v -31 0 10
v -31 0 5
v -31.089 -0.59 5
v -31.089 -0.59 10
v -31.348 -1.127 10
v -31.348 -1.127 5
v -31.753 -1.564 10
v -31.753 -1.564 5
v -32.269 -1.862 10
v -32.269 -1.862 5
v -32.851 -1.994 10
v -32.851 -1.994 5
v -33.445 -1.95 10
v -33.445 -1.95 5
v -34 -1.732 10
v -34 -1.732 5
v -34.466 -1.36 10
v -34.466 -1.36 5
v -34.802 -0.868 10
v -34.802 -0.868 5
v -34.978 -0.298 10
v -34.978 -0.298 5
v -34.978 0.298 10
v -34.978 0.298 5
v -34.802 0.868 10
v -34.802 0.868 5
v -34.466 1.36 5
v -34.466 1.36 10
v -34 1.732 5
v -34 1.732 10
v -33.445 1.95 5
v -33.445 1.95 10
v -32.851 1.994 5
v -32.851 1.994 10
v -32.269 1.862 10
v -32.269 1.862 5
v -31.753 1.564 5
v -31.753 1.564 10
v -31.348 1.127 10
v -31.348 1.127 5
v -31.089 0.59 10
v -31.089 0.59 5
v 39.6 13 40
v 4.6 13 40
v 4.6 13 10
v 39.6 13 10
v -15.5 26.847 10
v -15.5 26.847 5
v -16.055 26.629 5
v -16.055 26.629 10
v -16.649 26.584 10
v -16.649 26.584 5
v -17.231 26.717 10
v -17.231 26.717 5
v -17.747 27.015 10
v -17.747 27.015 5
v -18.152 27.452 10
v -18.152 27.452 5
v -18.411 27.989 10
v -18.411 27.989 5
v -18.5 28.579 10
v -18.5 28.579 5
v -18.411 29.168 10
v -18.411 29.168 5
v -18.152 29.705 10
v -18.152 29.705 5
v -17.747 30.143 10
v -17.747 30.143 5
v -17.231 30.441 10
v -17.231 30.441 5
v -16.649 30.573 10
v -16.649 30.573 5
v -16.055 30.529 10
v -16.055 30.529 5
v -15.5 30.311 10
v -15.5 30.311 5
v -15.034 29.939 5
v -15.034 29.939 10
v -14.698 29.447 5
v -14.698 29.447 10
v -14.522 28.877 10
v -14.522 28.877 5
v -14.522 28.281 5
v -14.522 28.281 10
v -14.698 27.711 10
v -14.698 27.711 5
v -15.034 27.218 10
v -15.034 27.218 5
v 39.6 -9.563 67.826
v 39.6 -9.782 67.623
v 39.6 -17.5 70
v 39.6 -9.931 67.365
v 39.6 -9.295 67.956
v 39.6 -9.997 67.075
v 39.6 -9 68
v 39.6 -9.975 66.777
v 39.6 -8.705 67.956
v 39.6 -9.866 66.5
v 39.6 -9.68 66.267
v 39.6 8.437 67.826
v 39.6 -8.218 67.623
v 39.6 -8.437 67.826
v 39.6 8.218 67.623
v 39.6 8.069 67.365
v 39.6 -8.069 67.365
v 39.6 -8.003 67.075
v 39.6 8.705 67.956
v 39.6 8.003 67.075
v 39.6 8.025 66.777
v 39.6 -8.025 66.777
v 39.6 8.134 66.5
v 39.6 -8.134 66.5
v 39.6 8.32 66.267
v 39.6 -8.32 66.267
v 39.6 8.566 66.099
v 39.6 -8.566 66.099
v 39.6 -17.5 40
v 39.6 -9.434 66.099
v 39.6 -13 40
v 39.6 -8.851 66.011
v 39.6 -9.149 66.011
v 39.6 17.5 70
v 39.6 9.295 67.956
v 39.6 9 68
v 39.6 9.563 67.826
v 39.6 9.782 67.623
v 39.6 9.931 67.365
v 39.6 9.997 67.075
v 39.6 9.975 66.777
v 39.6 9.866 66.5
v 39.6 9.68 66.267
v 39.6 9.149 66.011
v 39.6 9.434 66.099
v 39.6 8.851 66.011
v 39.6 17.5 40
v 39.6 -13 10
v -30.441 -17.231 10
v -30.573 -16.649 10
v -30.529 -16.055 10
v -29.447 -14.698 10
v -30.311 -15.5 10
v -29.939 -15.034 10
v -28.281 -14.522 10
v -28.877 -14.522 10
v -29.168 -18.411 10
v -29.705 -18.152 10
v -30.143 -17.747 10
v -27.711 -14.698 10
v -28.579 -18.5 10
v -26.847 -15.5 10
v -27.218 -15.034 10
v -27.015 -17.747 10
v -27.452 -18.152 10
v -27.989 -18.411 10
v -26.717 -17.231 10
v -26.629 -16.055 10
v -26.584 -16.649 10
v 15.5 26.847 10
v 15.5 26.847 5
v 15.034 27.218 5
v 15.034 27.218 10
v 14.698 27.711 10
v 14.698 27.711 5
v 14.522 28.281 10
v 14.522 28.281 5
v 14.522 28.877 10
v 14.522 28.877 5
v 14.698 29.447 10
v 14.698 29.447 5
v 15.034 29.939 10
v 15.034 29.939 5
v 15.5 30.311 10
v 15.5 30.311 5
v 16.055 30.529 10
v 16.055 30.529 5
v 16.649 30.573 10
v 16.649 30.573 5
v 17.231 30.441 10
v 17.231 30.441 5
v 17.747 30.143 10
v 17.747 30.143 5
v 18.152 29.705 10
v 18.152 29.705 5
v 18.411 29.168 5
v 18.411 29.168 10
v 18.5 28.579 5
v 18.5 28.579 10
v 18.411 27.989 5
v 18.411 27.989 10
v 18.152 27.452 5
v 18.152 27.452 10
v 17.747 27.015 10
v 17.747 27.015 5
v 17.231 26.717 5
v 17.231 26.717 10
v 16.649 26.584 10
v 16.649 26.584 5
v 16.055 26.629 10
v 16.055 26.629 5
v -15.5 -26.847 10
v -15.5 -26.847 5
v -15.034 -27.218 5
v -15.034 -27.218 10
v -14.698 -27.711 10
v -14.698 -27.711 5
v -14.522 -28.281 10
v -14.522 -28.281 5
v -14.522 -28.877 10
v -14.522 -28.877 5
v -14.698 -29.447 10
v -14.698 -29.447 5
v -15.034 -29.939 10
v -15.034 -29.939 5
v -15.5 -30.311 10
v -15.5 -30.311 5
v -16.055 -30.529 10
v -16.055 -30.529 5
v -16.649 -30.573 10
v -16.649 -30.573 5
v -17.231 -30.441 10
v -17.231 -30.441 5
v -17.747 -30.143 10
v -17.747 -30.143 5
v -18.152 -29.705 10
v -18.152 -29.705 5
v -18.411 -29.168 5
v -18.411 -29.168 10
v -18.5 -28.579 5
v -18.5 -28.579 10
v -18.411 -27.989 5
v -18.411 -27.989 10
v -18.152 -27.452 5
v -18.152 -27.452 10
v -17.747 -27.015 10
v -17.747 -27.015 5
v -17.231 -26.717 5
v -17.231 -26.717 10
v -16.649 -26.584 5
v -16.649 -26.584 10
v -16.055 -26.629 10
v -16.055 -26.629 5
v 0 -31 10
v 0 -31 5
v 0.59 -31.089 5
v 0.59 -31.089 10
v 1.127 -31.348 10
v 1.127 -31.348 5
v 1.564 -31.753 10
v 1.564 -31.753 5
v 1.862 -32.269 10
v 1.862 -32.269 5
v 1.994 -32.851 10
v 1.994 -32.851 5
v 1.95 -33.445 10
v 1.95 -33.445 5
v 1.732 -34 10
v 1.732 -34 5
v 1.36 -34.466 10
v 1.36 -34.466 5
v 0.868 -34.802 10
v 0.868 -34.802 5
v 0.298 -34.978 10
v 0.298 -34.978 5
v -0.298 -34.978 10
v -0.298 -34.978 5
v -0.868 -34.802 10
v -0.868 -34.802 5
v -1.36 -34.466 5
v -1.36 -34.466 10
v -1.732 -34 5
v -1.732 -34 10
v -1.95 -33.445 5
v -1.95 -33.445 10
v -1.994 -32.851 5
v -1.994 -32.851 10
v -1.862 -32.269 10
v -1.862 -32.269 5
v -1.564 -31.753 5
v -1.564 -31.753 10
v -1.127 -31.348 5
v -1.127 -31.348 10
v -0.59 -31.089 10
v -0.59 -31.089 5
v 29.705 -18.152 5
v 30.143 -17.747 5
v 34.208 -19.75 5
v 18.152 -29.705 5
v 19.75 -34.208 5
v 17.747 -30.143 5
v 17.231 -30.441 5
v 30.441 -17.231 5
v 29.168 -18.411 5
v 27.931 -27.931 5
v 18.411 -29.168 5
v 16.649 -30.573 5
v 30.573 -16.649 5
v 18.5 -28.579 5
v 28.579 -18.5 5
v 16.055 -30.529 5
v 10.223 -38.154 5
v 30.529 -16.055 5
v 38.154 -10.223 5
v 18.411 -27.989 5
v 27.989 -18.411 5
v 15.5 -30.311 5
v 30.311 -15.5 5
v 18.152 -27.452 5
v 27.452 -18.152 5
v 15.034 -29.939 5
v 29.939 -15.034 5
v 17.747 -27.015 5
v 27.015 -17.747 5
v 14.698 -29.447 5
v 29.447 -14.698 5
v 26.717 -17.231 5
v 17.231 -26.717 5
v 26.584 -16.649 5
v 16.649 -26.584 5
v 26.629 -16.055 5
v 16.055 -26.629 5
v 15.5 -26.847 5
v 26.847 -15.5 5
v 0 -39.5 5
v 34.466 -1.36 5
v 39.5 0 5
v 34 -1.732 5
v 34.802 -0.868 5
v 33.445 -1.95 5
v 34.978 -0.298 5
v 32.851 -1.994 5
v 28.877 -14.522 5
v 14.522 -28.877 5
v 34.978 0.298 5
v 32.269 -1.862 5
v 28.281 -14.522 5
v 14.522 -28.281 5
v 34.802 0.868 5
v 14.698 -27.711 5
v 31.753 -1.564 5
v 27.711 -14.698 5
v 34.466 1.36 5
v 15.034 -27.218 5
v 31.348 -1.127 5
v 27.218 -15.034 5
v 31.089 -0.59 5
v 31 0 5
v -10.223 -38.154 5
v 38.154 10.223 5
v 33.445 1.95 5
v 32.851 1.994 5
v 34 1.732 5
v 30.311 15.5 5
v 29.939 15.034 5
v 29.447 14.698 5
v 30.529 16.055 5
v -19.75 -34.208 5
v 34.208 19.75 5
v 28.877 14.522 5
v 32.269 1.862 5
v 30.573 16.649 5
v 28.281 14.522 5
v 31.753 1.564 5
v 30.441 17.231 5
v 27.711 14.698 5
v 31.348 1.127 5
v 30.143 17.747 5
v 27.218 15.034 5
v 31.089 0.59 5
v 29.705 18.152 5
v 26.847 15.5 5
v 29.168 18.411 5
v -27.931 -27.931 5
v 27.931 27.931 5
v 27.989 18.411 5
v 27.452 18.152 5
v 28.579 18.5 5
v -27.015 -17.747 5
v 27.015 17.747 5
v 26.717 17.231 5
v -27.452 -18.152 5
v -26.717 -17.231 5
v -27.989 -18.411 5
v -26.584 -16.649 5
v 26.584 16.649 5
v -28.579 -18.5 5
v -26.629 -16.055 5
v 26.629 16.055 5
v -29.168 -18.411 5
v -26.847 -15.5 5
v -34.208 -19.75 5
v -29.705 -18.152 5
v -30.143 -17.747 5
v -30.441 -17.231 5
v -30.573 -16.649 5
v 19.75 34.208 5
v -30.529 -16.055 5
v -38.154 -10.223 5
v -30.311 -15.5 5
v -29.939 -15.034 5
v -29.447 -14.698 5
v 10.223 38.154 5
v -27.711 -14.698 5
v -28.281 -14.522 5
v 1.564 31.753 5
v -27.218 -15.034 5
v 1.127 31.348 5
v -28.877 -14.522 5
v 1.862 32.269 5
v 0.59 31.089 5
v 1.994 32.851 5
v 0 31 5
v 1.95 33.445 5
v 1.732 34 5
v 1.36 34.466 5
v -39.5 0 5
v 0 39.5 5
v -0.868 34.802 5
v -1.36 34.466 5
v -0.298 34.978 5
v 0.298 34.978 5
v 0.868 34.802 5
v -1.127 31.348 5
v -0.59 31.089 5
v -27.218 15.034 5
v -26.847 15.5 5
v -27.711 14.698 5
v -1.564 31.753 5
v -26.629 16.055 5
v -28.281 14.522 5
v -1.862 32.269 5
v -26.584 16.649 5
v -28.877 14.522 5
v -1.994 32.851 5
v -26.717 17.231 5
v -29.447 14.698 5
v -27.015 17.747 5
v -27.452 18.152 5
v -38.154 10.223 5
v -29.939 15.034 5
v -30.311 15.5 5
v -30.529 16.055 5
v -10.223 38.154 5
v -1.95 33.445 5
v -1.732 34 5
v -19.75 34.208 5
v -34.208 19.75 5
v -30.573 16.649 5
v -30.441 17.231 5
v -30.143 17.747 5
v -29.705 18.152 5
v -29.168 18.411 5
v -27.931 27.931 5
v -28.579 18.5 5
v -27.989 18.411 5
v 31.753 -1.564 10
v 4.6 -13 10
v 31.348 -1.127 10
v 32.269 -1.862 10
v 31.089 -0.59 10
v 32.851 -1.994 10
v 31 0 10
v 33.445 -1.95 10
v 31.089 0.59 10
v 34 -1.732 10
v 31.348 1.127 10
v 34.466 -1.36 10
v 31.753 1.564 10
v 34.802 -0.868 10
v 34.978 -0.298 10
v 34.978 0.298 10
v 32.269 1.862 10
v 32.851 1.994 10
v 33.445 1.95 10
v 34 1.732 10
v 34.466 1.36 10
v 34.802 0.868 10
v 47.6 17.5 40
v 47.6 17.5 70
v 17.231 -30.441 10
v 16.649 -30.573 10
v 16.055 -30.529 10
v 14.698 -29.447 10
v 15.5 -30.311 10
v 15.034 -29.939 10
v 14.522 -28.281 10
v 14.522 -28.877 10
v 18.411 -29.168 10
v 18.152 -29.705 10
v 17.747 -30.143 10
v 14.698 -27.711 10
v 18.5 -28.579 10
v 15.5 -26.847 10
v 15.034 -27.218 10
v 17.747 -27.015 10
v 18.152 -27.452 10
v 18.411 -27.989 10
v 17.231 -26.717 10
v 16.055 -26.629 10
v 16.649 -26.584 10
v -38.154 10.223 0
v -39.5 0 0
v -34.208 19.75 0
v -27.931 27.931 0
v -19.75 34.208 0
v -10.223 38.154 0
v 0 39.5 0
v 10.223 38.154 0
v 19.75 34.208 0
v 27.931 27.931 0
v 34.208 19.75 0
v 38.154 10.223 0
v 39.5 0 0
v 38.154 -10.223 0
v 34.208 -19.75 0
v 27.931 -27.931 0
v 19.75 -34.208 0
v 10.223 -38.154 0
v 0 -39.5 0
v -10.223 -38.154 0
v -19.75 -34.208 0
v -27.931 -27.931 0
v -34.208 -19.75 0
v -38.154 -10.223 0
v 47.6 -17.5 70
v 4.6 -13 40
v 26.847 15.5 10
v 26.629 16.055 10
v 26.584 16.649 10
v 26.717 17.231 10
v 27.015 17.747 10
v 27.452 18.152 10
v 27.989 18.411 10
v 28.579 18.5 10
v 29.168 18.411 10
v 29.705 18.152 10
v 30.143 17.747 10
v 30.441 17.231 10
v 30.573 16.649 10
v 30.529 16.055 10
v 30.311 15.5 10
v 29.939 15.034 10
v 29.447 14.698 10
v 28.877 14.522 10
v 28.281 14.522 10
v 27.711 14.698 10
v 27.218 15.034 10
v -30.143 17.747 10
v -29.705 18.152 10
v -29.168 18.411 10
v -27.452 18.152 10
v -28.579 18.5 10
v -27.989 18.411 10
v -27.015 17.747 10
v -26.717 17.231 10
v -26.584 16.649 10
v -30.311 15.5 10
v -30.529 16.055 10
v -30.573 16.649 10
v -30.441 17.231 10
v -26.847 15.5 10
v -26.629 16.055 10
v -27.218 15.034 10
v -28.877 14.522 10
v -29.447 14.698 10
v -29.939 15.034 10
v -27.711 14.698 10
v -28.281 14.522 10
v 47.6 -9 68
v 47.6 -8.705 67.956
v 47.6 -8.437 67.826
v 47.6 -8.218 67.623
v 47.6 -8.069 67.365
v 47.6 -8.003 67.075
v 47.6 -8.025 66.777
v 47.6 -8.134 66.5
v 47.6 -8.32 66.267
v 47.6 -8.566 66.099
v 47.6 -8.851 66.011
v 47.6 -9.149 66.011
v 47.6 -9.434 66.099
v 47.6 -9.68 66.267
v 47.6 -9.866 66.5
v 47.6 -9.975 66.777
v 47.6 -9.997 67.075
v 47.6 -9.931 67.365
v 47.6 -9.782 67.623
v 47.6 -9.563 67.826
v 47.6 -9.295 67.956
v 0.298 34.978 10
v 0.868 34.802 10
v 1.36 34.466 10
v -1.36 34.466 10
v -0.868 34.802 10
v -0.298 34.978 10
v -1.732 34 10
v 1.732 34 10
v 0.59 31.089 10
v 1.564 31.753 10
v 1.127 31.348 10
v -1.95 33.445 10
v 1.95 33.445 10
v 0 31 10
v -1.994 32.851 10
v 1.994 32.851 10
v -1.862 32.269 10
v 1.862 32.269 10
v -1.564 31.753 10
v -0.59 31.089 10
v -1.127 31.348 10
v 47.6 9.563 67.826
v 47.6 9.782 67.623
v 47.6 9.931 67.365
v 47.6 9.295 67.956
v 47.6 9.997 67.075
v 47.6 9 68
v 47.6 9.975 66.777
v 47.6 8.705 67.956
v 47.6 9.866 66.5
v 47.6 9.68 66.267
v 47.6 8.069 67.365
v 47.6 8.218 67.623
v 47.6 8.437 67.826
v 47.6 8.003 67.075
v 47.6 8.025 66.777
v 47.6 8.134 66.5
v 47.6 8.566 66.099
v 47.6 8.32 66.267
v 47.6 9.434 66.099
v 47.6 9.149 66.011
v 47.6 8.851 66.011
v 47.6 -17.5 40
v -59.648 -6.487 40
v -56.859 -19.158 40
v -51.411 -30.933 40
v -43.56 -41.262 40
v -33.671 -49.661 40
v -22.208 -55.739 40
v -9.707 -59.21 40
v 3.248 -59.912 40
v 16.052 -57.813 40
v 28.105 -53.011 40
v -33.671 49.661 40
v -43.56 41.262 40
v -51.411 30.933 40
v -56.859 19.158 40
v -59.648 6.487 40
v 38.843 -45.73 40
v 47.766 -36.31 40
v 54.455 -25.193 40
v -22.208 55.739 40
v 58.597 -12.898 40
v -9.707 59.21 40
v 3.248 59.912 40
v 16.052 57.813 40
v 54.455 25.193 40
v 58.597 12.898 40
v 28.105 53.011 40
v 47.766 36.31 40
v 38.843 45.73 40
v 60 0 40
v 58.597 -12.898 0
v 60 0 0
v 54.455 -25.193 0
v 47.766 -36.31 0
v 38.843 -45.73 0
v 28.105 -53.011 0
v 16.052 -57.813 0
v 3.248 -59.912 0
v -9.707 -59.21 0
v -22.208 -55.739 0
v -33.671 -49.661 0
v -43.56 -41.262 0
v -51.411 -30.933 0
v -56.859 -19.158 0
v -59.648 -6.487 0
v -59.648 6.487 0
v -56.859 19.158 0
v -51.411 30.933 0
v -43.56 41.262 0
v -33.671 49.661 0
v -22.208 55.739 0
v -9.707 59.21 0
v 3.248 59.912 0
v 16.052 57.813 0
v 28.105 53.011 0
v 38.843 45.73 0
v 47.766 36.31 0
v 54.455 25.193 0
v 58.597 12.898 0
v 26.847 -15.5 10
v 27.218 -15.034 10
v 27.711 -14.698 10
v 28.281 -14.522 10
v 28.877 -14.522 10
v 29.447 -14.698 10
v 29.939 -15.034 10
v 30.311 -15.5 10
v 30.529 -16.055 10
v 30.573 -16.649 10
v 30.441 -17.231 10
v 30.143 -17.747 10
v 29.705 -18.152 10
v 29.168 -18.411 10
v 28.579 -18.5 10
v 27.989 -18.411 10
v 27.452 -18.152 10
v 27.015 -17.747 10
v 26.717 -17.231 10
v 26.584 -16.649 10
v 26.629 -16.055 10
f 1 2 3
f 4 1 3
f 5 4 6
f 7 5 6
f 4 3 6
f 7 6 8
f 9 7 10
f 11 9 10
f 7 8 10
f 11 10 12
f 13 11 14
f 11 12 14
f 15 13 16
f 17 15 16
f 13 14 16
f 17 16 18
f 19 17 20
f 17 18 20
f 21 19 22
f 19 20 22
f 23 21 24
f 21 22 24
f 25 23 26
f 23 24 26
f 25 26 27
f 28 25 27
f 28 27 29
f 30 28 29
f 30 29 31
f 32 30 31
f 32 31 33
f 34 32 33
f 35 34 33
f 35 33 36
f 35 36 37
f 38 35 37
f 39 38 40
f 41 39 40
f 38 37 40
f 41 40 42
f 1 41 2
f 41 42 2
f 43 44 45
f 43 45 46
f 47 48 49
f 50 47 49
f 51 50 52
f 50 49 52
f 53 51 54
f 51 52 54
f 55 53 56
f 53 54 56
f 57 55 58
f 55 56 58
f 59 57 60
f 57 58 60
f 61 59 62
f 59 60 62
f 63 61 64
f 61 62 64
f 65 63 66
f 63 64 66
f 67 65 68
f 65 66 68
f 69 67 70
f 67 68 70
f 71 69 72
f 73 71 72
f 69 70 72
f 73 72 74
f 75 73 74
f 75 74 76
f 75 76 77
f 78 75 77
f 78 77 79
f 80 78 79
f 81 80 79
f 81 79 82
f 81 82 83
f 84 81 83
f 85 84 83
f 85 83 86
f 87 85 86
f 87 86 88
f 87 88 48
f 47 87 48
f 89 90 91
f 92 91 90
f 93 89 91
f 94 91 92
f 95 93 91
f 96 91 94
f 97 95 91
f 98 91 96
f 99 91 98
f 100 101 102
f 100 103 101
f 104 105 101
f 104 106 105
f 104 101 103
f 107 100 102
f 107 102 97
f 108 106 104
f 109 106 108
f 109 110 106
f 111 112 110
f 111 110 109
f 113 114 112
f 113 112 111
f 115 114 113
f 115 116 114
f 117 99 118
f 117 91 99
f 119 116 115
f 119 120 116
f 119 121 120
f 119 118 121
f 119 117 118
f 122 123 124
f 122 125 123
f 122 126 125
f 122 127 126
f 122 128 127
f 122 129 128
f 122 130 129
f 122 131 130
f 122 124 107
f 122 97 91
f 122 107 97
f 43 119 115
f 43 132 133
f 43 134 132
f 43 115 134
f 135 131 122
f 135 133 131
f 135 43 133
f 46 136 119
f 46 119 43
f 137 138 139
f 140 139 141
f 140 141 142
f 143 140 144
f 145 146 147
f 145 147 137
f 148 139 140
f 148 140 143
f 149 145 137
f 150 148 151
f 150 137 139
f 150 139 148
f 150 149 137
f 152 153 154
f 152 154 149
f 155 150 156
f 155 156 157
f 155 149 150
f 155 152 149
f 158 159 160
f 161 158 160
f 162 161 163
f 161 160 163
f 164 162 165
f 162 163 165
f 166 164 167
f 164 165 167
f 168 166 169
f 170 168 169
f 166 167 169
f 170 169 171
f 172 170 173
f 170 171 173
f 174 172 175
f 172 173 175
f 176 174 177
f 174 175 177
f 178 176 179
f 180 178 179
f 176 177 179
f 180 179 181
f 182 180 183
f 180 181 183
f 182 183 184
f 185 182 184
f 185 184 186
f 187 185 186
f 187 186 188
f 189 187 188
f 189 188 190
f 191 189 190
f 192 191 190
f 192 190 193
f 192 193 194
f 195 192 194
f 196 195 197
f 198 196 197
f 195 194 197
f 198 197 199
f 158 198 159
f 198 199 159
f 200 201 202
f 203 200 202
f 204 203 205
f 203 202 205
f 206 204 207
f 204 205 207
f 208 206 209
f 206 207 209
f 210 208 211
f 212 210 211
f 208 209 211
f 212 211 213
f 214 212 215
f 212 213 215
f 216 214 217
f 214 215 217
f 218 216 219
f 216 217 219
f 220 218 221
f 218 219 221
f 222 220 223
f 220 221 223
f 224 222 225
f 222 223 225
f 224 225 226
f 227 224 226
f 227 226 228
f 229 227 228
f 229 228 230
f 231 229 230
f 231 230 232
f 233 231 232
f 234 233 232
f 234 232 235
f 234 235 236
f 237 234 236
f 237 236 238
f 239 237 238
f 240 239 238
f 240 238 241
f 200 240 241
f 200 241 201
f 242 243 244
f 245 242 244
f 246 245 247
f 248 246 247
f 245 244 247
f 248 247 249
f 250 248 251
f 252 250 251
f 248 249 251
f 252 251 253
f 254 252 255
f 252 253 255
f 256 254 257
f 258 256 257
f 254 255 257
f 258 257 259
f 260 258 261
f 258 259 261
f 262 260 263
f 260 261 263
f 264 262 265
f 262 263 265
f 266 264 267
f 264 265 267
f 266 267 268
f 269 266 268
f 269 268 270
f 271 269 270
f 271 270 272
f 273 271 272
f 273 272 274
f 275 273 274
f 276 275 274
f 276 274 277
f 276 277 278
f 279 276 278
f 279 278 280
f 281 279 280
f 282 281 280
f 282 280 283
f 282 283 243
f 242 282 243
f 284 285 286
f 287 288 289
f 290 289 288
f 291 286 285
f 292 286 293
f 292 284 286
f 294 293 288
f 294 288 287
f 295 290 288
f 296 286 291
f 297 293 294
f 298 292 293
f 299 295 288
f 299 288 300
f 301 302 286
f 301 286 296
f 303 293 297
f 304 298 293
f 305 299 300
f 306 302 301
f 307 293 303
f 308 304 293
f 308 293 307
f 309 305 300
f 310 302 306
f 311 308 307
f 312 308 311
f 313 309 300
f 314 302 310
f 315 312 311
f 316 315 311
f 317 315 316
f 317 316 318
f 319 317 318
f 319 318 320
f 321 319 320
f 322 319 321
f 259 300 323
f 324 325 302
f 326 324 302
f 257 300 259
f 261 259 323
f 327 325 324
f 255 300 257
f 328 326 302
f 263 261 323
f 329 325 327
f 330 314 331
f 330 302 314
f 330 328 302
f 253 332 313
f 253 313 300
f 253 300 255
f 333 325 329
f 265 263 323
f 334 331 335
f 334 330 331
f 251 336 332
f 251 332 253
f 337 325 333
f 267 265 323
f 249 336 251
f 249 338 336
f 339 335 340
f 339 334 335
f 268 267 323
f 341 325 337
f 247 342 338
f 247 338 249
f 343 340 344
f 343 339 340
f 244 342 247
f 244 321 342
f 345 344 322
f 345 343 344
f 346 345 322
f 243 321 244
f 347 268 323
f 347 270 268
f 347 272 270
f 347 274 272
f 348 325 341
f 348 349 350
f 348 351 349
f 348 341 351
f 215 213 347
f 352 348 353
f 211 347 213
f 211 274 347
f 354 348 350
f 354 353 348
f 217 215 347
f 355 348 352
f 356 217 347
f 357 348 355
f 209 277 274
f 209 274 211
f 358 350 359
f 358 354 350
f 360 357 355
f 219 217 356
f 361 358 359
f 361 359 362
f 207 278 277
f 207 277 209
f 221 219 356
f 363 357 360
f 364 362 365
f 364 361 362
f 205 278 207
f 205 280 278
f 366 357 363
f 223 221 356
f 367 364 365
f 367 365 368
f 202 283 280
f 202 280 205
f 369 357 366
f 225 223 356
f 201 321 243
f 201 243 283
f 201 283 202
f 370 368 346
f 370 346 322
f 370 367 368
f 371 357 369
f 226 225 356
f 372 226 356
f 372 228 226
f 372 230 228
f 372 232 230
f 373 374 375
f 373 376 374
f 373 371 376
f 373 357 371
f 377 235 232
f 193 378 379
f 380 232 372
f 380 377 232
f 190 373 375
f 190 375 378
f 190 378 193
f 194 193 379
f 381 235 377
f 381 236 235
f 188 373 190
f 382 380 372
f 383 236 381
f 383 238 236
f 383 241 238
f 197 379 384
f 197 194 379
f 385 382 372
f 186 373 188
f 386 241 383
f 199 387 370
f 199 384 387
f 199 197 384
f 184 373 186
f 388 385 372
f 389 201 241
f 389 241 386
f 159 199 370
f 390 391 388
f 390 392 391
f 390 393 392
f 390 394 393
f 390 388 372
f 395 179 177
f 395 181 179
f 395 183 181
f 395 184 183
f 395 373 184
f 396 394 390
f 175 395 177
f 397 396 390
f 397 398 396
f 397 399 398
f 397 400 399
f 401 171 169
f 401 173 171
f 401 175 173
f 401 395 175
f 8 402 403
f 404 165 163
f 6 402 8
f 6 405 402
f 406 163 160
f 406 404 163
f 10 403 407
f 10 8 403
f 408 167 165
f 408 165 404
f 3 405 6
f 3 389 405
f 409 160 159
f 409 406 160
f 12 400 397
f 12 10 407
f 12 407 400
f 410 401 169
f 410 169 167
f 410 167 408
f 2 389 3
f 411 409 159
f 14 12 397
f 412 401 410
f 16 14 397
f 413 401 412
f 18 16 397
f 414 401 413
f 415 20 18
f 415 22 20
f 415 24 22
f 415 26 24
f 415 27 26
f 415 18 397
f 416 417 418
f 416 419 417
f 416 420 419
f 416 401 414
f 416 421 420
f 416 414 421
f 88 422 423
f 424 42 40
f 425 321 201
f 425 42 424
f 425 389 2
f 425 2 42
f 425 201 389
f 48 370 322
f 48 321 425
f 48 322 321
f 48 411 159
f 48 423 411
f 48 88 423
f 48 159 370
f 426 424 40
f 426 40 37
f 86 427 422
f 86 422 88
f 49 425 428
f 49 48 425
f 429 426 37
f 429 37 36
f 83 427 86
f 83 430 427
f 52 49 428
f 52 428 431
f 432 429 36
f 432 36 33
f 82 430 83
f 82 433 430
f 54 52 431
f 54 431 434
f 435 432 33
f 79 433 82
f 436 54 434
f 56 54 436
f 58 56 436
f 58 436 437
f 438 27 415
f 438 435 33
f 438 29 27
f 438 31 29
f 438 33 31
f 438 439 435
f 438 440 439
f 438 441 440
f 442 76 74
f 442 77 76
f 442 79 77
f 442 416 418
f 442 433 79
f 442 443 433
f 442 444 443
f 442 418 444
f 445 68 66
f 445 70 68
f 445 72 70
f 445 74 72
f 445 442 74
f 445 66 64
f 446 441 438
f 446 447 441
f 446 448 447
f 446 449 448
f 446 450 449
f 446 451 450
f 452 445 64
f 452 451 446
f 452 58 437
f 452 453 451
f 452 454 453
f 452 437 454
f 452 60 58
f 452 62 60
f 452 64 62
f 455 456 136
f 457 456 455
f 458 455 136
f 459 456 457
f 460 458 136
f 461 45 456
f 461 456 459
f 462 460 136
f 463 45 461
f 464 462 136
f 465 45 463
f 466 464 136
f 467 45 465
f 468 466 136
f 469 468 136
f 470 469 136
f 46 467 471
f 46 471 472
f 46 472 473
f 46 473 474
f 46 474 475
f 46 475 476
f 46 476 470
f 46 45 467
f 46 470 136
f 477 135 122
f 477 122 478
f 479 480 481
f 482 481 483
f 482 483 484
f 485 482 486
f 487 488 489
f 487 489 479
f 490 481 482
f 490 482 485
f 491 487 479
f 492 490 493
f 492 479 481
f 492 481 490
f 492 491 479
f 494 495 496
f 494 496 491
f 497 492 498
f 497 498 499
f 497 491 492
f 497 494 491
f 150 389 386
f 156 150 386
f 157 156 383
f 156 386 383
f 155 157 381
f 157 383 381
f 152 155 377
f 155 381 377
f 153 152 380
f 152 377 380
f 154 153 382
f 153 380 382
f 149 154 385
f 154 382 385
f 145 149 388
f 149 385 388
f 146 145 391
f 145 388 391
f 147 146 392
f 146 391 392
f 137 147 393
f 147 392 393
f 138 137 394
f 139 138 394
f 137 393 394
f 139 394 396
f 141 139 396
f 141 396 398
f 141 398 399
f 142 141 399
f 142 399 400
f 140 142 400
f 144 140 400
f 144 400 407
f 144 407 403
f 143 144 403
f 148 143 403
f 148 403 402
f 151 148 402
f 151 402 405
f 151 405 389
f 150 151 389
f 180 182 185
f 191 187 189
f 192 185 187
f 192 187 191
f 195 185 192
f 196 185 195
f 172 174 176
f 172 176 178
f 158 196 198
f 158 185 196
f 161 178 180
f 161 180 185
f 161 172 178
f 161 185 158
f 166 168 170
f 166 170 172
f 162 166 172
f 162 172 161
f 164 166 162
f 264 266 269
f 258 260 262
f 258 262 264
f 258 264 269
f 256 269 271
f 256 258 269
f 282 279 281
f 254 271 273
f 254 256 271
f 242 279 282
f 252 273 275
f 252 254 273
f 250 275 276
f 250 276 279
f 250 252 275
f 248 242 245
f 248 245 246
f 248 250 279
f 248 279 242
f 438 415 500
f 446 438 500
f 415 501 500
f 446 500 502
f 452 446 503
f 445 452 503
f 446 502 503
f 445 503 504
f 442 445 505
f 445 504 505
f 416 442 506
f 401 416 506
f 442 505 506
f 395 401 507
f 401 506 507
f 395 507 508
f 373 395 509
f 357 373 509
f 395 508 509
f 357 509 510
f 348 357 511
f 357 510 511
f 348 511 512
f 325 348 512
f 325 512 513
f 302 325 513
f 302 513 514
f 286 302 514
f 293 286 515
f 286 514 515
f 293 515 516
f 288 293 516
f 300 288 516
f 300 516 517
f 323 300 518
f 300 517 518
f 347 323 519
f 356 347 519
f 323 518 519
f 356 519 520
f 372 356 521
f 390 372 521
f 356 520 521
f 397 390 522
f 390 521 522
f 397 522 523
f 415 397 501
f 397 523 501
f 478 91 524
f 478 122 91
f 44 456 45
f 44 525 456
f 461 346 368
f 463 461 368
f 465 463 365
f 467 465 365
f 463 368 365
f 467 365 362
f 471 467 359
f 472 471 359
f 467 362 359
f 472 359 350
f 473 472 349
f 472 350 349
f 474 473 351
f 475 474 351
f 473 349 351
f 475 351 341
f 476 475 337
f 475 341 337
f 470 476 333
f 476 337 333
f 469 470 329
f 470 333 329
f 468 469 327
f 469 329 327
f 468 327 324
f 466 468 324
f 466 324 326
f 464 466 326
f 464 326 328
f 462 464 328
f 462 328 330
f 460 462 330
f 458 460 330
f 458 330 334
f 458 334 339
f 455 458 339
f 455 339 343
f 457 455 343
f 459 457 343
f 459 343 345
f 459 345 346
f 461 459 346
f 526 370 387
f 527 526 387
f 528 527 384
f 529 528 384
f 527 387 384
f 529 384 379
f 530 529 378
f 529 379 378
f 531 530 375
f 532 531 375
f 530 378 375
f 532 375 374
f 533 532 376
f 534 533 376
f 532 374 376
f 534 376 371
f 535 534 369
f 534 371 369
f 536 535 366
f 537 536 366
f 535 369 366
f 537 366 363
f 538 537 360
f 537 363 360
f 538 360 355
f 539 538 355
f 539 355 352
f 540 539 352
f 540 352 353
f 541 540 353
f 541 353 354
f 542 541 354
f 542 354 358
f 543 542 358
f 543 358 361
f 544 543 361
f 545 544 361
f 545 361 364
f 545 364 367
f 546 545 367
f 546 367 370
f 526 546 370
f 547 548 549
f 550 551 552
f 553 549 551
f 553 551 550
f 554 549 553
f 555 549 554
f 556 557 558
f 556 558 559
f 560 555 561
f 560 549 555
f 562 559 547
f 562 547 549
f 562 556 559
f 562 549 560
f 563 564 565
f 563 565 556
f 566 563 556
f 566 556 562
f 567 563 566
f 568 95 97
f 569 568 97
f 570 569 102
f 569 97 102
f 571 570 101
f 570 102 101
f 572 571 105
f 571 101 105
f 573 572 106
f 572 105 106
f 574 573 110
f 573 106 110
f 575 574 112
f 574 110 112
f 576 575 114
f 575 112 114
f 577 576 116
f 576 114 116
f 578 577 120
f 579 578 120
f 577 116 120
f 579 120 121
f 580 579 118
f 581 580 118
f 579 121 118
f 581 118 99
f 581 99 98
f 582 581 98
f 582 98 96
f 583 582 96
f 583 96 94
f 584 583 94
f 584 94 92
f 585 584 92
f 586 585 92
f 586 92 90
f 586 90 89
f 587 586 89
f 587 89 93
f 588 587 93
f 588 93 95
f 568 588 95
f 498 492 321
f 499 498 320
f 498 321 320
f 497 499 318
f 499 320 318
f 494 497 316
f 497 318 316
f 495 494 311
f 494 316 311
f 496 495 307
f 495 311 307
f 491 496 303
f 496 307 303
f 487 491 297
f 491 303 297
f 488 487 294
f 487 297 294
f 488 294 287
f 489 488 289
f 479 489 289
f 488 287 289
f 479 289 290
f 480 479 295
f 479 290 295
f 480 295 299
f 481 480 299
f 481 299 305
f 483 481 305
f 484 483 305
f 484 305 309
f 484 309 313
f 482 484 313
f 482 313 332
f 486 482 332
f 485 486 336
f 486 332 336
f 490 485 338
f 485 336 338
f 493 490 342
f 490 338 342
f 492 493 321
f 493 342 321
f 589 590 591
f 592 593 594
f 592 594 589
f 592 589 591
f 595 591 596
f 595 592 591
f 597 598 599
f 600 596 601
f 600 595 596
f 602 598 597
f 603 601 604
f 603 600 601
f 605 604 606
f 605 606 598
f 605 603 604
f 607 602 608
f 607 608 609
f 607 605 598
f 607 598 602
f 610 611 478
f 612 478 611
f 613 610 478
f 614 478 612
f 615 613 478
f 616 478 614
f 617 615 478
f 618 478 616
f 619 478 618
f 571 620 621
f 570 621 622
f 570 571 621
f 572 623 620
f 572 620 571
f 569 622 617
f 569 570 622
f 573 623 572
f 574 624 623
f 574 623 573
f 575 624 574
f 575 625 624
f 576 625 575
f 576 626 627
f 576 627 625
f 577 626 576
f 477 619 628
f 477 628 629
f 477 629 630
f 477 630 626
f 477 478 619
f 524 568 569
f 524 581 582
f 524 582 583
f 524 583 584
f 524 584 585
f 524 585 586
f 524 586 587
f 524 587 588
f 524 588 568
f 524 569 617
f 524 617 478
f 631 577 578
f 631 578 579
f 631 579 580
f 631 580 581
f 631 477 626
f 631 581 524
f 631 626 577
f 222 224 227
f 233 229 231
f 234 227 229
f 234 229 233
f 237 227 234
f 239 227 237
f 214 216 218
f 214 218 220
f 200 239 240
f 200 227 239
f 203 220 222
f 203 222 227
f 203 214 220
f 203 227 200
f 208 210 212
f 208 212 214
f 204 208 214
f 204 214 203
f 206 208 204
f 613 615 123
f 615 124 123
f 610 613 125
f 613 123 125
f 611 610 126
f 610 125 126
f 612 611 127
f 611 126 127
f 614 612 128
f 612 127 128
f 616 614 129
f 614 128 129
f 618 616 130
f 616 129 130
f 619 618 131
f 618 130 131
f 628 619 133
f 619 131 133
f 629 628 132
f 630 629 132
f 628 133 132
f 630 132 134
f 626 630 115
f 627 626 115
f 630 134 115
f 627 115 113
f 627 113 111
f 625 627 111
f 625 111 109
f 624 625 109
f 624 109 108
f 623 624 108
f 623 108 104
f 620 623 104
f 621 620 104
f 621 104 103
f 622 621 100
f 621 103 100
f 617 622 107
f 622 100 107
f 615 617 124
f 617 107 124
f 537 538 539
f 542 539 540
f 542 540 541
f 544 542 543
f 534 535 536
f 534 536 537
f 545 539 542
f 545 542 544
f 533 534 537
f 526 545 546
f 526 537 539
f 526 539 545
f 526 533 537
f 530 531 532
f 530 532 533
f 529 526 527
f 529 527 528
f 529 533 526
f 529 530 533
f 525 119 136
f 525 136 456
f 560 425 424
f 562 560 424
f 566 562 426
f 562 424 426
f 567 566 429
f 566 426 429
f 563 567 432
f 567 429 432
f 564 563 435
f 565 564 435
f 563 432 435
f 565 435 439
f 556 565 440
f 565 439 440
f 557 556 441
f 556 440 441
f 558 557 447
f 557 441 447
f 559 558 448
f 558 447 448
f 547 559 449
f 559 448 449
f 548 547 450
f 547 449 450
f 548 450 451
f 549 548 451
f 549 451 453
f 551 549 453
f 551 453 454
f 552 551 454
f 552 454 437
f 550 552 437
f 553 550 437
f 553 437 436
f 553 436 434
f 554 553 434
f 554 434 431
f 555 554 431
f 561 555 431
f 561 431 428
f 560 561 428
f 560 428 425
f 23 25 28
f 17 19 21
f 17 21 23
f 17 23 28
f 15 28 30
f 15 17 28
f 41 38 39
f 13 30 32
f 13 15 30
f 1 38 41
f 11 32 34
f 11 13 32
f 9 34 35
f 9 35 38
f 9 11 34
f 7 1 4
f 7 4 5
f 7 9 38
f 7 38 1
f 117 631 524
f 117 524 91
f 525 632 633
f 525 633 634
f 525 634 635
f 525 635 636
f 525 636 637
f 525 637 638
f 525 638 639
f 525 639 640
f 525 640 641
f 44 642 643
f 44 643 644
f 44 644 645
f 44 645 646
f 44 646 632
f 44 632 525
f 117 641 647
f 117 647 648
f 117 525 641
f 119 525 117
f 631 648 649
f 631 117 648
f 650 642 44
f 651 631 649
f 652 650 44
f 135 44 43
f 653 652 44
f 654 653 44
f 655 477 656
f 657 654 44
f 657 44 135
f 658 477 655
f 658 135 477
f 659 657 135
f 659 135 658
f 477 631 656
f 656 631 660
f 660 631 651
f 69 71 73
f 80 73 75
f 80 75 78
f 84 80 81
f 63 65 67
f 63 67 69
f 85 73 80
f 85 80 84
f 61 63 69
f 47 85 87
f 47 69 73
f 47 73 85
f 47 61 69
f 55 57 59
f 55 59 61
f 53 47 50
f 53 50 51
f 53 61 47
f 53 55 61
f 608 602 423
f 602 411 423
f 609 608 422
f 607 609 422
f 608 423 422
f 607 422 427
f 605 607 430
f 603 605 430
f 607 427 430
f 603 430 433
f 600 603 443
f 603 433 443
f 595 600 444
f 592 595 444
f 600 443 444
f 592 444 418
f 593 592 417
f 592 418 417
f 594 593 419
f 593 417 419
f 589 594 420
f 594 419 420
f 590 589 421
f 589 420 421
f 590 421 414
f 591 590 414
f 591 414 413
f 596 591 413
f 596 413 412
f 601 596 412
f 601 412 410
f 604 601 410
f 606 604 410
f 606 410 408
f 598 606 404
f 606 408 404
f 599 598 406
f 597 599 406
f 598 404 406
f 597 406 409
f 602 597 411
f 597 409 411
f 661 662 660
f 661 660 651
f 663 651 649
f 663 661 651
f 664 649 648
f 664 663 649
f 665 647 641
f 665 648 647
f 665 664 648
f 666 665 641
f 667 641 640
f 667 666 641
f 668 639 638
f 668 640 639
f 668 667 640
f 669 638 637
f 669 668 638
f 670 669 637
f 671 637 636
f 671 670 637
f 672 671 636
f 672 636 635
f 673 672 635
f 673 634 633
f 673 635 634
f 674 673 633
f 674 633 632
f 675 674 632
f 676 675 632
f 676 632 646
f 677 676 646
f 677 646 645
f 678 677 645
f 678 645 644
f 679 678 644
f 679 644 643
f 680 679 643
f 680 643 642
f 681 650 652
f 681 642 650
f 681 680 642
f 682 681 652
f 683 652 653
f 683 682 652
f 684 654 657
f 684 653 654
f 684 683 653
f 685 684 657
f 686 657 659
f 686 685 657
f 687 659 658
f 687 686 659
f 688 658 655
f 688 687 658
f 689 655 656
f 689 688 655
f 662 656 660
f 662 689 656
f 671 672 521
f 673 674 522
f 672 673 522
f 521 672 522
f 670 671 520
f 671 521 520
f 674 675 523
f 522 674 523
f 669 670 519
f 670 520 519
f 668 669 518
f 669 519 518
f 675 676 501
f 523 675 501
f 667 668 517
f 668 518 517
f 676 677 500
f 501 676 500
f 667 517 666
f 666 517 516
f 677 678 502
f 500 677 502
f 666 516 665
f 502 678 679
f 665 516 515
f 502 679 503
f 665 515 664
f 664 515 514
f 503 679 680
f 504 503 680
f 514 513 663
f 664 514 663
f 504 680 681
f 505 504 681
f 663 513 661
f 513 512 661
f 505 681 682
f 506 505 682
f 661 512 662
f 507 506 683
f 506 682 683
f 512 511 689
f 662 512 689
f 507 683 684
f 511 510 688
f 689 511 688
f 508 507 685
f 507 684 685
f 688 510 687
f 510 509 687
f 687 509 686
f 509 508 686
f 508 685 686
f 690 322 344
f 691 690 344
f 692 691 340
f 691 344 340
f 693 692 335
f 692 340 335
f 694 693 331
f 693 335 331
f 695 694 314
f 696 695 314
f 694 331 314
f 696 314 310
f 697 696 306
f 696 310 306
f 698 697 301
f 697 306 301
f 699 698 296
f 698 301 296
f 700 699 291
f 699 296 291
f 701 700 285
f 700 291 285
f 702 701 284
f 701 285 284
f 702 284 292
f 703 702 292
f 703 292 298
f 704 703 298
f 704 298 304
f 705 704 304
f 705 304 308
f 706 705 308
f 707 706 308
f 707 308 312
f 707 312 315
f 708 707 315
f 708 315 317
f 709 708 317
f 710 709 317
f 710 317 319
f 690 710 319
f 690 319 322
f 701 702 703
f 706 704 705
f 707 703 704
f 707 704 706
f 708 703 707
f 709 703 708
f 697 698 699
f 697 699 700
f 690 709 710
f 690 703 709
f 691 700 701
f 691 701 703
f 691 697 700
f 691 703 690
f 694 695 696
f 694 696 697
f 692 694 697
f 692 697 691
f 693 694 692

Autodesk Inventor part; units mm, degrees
ref_plane "YZ Plane" through (0, 0, 0) normal (1, 0, 0) x (0, 1, 0)
ref_plane "XZ Plane" through (0, 0, 0) normal (0, 1, 0) x (-1, 0, 0)
ref_plane "XY Plane" through (0, 0, 0) normal (0, 0, 1) x (1, 0, 0)
sketch "Sketch1" plane through (0, 0, 0) normal (0, 0, 1) x (1, 0, 0)
  circle A0 centre (0, 0) radius 60
  dimension "d0" = 120
extrude "Extrusion1" add sketch "Sketch1" along normal blind 40
sketch "Sketch4" plane through (0, 0, 40) normal (0, 0, 1) x (1, 0, 0)
  line L0 (4.6, 13) -> (39.6, 13)
  line L1 (39.6, 13) -> (39.6, -13)
  line L2 (39.6, -13) -> (4.6, -13)
  line L3 (4.6, -13) -> (4.6, 13)
  line L4 (0, 0) -> (4.6, 0) construction
  dimension "d14" = 35
  dimension "d15" = 26
  dimension "d16" = 4.6
extrude "Extrusion4" cut sketch "Sketch4" against normal blind 30
sketch "Sketch5" plane through (0, 0, 40) normal (0, 0, 1) x (1, 0, 0)
  line L0 (47.6, -17.5) -> (39.6, -17.5)
  line L1 (39.6, -17.5) -> (39.6, 17.5)
  line L2 (39.6, 17.5) -> (47.6, 17.5)
  line L3 (47.6, 17.5) -> (47.6, -17.5)
  line L4 (39.6, 13) -> (39.6, -13) projected
  point P0 (0, 0)
  point P1 (39.6, 0)
  point P2 (39.6, 0)
  dimension "d19" = 35
  dimension "d20" = 8
extrude "Extrusion5" add sketch "Sketch5" along normal blind 30
sketch "Sketch6" plane through (39.6, -13, 10) normal (-1, 0, 0) x (0, 0, 1)
  circle A0 centre (57, 22) radius 1
  circle A1 centre (57, 4) radius 1
  line L0 (57, 22) -> (57, 4) construction
  line L1 (60, 30.5) -> (60, -4.5) construction
  point P0 (-10, 13)
  point P1 (57, 13)
  point P2 (60, 13)
  dimension "d23" = 18
  dimension "d24" = 2
  dimension "d25" = 2
  dimension "d26" = 3
extrude "Extrusion6" cut sketch "Sketch6" against normal up to surface (8 mm away)
sketch "Sketch7" plane through (0, 0, 0) normal (0, 0, -1) x (-1, 0, 0)
  circle A0 centre (0, 0) radius 39.5
  dimension "d29" = 79
extrude "Extrusion7" cut sketch "Sketch7" against normal blind 5
sketch "Sketch8" plane through (0, 0, 5) normal (0, 0, -1) x (-1, 0, 0)
  circle A0 centre (-33, 0) radius 2
  point P0 (0, 0)
  dimension "d32" = 33
  dimension "d33" = 4
extrude "Extrusion8" cut sketch "Sketch8" against normal blind 5
pattern_circular "Circular Pattern1" count 12 over 360 about axis through (0, 0, 0) along (0, 0, 1) of "Extrusion8"
properties part number "manipulator base"
